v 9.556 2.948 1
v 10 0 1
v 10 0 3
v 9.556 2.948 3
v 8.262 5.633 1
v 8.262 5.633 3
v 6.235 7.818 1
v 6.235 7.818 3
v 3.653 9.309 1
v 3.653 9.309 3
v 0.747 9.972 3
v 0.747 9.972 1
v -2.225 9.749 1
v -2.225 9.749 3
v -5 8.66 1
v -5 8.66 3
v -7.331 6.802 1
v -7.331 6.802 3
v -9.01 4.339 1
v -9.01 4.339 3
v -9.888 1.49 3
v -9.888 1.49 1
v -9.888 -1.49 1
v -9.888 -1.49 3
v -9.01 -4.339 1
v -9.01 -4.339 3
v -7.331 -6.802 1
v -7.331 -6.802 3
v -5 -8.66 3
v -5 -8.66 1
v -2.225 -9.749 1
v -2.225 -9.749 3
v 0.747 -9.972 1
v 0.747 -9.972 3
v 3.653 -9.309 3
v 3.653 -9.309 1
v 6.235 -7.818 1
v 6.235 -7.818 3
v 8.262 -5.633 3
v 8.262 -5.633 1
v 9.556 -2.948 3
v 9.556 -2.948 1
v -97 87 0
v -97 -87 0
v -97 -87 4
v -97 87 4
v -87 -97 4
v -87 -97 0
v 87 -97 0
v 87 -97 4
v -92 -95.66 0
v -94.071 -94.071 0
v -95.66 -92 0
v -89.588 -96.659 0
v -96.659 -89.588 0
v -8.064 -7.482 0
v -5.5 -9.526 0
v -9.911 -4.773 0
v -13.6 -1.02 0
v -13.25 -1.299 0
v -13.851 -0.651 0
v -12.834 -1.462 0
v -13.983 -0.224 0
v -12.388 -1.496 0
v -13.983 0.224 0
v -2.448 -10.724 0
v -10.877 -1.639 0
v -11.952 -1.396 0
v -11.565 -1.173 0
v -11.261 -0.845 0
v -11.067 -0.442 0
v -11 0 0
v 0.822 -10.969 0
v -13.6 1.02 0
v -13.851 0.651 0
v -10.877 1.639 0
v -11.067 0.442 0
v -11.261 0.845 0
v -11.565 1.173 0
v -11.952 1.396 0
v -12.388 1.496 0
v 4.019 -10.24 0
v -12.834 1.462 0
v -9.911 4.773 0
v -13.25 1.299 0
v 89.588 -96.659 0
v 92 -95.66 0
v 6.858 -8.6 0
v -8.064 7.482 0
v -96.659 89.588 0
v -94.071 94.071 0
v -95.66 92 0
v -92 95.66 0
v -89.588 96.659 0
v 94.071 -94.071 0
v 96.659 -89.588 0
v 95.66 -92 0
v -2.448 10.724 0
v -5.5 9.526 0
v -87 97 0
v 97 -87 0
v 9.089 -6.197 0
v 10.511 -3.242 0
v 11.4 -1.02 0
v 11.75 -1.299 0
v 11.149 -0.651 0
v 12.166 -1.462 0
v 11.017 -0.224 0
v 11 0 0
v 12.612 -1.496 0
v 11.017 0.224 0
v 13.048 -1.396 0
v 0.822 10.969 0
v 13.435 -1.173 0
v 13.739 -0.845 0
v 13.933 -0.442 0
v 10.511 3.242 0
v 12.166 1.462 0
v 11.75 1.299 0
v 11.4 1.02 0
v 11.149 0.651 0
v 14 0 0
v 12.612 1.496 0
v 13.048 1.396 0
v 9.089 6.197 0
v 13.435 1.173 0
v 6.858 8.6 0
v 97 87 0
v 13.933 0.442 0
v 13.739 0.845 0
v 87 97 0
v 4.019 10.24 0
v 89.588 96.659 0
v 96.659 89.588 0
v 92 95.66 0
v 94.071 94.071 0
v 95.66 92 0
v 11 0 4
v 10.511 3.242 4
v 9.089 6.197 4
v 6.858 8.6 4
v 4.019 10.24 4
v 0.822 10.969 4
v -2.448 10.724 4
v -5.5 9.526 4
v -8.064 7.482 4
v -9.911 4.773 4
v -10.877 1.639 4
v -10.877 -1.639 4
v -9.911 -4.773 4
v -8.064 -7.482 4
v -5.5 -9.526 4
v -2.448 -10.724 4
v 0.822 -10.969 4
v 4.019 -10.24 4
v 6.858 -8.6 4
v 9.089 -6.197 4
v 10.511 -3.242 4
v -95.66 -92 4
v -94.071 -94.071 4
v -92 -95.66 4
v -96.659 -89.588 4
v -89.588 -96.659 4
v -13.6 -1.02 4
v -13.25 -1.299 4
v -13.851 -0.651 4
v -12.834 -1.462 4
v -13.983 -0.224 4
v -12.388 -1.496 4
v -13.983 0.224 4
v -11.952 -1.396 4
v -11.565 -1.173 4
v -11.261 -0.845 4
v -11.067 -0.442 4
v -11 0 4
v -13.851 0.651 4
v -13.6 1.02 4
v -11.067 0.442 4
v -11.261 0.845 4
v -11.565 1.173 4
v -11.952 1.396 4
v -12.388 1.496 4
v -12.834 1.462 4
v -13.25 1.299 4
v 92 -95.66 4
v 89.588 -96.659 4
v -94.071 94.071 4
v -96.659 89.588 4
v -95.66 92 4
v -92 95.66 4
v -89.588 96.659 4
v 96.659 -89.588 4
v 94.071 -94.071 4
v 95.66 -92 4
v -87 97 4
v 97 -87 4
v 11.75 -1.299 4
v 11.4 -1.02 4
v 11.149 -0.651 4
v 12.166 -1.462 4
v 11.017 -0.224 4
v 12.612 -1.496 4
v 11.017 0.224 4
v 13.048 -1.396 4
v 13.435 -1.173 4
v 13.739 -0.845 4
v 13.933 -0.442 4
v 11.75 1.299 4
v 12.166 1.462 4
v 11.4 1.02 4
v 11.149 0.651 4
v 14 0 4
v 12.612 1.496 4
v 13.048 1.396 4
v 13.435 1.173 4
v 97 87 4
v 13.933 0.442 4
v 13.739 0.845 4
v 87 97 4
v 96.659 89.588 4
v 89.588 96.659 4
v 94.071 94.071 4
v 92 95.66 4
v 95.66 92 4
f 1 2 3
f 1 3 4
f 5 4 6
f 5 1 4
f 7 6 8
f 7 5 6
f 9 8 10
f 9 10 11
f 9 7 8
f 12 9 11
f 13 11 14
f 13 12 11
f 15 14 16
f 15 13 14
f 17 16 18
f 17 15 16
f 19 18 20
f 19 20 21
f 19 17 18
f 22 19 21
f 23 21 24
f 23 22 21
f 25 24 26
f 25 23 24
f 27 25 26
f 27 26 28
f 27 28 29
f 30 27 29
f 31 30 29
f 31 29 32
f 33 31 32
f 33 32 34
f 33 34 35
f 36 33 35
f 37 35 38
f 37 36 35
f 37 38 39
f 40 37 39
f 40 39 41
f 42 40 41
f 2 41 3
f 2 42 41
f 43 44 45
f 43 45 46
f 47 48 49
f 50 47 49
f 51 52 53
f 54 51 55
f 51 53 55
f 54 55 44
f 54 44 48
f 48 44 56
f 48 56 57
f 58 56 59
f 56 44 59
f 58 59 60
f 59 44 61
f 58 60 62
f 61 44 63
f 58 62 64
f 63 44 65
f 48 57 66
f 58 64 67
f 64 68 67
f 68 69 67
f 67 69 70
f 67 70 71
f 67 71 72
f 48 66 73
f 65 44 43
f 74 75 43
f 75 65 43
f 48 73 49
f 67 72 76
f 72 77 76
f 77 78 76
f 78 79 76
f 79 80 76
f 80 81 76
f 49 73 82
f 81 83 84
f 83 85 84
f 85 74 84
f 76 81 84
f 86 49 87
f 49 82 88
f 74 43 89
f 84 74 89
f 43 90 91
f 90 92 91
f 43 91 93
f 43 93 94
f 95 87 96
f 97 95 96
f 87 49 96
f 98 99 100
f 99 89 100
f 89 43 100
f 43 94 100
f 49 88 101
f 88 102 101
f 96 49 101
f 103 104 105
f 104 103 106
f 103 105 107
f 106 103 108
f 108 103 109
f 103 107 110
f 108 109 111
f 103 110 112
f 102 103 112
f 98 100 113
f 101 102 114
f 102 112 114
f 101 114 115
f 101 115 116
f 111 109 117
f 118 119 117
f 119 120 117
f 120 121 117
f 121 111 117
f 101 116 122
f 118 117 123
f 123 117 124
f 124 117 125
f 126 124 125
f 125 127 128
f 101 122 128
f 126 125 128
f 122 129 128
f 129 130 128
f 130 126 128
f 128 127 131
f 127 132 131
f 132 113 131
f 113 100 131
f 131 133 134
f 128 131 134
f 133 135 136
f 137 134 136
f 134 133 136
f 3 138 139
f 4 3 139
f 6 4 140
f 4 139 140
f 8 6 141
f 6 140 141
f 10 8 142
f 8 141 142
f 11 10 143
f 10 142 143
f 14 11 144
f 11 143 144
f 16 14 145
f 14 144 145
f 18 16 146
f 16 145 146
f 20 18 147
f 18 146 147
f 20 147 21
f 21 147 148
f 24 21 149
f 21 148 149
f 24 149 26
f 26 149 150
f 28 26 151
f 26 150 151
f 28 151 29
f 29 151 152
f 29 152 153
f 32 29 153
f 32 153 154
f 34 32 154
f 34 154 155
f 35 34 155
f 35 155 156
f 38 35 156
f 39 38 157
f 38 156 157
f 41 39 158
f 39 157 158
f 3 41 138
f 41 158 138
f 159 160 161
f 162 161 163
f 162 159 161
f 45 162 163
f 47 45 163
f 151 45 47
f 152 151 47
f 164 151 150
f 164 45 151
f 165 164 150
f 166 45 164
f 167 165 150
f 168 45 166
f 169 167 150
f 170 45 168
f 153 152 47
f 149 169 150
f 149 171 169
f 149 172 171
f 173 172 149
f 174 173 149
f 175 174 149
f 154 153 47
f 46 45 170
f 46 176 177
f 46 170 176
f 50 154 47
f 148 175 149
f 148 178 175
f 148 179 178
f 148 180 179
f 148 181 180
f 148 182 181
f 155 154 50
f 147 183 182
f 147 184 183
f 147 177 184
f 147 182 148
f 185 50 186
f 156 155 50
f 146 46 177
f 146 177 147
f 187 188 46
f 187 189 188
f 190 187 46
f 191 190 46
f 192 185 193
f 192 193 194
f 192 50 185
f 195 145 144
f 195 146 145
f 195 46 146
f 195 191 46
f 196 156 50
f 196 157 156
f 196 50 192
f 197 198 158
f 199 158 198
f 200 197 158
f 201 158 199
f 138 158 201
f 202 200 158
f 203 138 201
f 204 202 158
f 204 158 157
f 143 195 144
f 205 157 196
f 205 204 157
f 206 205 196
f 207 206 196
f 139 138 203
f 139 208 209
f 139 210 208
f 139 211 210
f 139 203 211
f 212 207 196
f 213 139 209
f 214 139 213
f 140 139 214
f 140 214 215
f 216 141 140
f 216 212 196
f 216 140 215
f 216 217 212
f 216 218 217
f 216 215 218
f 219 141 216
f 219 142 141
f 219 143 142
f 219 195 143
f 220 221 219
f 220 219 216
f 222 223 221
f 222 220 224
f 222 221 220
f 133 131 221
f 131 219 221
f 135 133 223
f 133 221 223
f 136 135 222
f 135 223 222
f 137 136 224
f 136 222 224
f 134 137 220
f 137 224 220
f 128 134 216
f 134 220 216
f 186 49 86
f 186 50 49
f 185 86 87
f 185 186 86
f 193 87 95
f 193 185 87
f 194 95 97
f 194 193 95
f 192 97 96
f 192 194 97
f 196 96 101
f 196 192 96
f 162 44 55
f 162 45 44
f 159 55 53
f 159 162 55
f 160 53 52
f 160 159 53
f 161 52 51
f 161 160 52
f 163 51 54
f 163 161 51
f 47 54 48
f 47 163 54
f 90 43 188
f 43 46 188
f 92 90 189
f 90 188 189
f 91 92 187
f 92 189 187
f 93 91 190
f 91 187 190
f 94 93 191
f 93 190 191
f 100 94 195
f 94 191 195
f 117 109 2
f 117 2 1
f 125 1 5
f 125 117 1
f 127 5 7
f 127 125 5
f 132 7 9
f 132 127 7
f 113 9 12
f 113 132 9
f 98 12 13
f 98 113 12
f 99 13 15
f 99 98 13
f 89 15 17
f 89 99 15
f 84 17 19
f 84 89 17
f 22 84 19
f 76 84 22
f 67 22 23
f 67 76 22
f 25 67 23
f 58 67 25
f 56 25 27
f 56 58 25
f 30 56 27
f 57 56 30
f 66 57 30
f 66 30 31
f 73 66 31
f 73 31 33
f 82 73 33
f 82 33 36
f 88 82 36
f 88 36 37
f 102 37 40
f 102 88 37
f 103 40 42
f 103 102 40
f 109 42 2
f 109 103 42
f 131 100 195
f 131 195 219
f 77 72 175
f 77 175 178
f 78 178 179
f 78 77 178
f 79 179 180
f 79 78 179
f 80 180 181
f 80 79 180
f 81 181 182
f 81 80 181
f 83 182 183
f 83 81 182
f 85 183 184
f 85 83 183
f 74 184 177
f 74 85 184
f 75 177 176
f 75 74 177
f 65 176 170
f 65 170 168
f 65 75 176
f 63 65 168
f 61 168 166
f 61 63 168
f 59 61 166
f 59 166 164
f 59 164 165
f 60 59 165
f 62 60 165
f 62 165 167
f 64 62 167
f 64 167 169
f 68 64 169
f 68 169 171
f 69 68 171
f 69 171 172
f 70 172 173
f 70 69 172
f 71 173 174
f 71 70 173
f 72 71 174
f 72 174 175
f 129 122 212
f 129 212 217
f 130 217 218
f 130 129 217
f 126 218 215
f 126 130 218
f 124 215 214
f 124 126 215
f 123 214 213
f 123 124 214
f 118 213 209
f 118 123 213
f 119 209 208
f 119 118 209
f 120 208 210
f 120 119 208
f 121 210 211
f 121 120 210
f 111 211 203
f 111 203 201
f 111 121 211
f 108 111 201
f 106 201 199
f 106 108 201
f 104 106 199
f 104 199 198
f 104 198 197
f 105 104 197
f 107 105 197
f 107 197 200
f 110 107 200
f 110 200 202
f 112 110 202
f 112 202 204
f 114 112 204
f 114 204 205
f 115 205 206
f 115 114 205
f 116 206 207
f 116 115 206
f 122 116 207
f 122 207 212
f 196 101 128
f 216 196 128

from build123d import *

# Parameters (mm, degrees)
F0_W     = 194
F0_H     = 194
F0_R     = 1.5
F0_R_2   = 10
F1_DEPTH = 4
F2_SIZE  = 0.99999
F3_R     = 10


# Not quite as in the source:
# - a fillet or chamfer is up to 0.001 mm smaller than in the source, because OpenCascade refuses the exact size


with BuildPart() as f1:
    # F0 (on Top) → F1 (new body)
    with BuildSketch(Plane.XY):
        Rectangle(F0_W, F0_H)
        with Locations((-12.5, 0)):
            Circle(F0_R, mode=Mode.SUBTRACT)
        Circle(F0_R_2, mode=Mode.SUBTRACT)
        with Locations((12.5, 0)):
            Circle(F0_R, mode=Mode.SUBTRACT)
    extrude(amount=F1_DEPTH)

    # F2 (size 1 in the source; OpenCascade refuses exactly that, so slightly less here)
    f2_edges = [f1.edges().sort_by_distance(p)[0] for p in [
        (-10, 0, 4),
        (-10, 0, 0),
    ]]
    chamfer(f2_edges, length=F2_SIZE)

    # F3
    f3_edges = [f1.edges().sort_by_distance(p)[0] for p in [
        (-97, 97, 2),
        (-97, -97, 2),
        (97, -97, 2),
        (97, 97, 2),
    ]]
    fillet(f3_edges, radius=F3_R)


solid = f1.part
